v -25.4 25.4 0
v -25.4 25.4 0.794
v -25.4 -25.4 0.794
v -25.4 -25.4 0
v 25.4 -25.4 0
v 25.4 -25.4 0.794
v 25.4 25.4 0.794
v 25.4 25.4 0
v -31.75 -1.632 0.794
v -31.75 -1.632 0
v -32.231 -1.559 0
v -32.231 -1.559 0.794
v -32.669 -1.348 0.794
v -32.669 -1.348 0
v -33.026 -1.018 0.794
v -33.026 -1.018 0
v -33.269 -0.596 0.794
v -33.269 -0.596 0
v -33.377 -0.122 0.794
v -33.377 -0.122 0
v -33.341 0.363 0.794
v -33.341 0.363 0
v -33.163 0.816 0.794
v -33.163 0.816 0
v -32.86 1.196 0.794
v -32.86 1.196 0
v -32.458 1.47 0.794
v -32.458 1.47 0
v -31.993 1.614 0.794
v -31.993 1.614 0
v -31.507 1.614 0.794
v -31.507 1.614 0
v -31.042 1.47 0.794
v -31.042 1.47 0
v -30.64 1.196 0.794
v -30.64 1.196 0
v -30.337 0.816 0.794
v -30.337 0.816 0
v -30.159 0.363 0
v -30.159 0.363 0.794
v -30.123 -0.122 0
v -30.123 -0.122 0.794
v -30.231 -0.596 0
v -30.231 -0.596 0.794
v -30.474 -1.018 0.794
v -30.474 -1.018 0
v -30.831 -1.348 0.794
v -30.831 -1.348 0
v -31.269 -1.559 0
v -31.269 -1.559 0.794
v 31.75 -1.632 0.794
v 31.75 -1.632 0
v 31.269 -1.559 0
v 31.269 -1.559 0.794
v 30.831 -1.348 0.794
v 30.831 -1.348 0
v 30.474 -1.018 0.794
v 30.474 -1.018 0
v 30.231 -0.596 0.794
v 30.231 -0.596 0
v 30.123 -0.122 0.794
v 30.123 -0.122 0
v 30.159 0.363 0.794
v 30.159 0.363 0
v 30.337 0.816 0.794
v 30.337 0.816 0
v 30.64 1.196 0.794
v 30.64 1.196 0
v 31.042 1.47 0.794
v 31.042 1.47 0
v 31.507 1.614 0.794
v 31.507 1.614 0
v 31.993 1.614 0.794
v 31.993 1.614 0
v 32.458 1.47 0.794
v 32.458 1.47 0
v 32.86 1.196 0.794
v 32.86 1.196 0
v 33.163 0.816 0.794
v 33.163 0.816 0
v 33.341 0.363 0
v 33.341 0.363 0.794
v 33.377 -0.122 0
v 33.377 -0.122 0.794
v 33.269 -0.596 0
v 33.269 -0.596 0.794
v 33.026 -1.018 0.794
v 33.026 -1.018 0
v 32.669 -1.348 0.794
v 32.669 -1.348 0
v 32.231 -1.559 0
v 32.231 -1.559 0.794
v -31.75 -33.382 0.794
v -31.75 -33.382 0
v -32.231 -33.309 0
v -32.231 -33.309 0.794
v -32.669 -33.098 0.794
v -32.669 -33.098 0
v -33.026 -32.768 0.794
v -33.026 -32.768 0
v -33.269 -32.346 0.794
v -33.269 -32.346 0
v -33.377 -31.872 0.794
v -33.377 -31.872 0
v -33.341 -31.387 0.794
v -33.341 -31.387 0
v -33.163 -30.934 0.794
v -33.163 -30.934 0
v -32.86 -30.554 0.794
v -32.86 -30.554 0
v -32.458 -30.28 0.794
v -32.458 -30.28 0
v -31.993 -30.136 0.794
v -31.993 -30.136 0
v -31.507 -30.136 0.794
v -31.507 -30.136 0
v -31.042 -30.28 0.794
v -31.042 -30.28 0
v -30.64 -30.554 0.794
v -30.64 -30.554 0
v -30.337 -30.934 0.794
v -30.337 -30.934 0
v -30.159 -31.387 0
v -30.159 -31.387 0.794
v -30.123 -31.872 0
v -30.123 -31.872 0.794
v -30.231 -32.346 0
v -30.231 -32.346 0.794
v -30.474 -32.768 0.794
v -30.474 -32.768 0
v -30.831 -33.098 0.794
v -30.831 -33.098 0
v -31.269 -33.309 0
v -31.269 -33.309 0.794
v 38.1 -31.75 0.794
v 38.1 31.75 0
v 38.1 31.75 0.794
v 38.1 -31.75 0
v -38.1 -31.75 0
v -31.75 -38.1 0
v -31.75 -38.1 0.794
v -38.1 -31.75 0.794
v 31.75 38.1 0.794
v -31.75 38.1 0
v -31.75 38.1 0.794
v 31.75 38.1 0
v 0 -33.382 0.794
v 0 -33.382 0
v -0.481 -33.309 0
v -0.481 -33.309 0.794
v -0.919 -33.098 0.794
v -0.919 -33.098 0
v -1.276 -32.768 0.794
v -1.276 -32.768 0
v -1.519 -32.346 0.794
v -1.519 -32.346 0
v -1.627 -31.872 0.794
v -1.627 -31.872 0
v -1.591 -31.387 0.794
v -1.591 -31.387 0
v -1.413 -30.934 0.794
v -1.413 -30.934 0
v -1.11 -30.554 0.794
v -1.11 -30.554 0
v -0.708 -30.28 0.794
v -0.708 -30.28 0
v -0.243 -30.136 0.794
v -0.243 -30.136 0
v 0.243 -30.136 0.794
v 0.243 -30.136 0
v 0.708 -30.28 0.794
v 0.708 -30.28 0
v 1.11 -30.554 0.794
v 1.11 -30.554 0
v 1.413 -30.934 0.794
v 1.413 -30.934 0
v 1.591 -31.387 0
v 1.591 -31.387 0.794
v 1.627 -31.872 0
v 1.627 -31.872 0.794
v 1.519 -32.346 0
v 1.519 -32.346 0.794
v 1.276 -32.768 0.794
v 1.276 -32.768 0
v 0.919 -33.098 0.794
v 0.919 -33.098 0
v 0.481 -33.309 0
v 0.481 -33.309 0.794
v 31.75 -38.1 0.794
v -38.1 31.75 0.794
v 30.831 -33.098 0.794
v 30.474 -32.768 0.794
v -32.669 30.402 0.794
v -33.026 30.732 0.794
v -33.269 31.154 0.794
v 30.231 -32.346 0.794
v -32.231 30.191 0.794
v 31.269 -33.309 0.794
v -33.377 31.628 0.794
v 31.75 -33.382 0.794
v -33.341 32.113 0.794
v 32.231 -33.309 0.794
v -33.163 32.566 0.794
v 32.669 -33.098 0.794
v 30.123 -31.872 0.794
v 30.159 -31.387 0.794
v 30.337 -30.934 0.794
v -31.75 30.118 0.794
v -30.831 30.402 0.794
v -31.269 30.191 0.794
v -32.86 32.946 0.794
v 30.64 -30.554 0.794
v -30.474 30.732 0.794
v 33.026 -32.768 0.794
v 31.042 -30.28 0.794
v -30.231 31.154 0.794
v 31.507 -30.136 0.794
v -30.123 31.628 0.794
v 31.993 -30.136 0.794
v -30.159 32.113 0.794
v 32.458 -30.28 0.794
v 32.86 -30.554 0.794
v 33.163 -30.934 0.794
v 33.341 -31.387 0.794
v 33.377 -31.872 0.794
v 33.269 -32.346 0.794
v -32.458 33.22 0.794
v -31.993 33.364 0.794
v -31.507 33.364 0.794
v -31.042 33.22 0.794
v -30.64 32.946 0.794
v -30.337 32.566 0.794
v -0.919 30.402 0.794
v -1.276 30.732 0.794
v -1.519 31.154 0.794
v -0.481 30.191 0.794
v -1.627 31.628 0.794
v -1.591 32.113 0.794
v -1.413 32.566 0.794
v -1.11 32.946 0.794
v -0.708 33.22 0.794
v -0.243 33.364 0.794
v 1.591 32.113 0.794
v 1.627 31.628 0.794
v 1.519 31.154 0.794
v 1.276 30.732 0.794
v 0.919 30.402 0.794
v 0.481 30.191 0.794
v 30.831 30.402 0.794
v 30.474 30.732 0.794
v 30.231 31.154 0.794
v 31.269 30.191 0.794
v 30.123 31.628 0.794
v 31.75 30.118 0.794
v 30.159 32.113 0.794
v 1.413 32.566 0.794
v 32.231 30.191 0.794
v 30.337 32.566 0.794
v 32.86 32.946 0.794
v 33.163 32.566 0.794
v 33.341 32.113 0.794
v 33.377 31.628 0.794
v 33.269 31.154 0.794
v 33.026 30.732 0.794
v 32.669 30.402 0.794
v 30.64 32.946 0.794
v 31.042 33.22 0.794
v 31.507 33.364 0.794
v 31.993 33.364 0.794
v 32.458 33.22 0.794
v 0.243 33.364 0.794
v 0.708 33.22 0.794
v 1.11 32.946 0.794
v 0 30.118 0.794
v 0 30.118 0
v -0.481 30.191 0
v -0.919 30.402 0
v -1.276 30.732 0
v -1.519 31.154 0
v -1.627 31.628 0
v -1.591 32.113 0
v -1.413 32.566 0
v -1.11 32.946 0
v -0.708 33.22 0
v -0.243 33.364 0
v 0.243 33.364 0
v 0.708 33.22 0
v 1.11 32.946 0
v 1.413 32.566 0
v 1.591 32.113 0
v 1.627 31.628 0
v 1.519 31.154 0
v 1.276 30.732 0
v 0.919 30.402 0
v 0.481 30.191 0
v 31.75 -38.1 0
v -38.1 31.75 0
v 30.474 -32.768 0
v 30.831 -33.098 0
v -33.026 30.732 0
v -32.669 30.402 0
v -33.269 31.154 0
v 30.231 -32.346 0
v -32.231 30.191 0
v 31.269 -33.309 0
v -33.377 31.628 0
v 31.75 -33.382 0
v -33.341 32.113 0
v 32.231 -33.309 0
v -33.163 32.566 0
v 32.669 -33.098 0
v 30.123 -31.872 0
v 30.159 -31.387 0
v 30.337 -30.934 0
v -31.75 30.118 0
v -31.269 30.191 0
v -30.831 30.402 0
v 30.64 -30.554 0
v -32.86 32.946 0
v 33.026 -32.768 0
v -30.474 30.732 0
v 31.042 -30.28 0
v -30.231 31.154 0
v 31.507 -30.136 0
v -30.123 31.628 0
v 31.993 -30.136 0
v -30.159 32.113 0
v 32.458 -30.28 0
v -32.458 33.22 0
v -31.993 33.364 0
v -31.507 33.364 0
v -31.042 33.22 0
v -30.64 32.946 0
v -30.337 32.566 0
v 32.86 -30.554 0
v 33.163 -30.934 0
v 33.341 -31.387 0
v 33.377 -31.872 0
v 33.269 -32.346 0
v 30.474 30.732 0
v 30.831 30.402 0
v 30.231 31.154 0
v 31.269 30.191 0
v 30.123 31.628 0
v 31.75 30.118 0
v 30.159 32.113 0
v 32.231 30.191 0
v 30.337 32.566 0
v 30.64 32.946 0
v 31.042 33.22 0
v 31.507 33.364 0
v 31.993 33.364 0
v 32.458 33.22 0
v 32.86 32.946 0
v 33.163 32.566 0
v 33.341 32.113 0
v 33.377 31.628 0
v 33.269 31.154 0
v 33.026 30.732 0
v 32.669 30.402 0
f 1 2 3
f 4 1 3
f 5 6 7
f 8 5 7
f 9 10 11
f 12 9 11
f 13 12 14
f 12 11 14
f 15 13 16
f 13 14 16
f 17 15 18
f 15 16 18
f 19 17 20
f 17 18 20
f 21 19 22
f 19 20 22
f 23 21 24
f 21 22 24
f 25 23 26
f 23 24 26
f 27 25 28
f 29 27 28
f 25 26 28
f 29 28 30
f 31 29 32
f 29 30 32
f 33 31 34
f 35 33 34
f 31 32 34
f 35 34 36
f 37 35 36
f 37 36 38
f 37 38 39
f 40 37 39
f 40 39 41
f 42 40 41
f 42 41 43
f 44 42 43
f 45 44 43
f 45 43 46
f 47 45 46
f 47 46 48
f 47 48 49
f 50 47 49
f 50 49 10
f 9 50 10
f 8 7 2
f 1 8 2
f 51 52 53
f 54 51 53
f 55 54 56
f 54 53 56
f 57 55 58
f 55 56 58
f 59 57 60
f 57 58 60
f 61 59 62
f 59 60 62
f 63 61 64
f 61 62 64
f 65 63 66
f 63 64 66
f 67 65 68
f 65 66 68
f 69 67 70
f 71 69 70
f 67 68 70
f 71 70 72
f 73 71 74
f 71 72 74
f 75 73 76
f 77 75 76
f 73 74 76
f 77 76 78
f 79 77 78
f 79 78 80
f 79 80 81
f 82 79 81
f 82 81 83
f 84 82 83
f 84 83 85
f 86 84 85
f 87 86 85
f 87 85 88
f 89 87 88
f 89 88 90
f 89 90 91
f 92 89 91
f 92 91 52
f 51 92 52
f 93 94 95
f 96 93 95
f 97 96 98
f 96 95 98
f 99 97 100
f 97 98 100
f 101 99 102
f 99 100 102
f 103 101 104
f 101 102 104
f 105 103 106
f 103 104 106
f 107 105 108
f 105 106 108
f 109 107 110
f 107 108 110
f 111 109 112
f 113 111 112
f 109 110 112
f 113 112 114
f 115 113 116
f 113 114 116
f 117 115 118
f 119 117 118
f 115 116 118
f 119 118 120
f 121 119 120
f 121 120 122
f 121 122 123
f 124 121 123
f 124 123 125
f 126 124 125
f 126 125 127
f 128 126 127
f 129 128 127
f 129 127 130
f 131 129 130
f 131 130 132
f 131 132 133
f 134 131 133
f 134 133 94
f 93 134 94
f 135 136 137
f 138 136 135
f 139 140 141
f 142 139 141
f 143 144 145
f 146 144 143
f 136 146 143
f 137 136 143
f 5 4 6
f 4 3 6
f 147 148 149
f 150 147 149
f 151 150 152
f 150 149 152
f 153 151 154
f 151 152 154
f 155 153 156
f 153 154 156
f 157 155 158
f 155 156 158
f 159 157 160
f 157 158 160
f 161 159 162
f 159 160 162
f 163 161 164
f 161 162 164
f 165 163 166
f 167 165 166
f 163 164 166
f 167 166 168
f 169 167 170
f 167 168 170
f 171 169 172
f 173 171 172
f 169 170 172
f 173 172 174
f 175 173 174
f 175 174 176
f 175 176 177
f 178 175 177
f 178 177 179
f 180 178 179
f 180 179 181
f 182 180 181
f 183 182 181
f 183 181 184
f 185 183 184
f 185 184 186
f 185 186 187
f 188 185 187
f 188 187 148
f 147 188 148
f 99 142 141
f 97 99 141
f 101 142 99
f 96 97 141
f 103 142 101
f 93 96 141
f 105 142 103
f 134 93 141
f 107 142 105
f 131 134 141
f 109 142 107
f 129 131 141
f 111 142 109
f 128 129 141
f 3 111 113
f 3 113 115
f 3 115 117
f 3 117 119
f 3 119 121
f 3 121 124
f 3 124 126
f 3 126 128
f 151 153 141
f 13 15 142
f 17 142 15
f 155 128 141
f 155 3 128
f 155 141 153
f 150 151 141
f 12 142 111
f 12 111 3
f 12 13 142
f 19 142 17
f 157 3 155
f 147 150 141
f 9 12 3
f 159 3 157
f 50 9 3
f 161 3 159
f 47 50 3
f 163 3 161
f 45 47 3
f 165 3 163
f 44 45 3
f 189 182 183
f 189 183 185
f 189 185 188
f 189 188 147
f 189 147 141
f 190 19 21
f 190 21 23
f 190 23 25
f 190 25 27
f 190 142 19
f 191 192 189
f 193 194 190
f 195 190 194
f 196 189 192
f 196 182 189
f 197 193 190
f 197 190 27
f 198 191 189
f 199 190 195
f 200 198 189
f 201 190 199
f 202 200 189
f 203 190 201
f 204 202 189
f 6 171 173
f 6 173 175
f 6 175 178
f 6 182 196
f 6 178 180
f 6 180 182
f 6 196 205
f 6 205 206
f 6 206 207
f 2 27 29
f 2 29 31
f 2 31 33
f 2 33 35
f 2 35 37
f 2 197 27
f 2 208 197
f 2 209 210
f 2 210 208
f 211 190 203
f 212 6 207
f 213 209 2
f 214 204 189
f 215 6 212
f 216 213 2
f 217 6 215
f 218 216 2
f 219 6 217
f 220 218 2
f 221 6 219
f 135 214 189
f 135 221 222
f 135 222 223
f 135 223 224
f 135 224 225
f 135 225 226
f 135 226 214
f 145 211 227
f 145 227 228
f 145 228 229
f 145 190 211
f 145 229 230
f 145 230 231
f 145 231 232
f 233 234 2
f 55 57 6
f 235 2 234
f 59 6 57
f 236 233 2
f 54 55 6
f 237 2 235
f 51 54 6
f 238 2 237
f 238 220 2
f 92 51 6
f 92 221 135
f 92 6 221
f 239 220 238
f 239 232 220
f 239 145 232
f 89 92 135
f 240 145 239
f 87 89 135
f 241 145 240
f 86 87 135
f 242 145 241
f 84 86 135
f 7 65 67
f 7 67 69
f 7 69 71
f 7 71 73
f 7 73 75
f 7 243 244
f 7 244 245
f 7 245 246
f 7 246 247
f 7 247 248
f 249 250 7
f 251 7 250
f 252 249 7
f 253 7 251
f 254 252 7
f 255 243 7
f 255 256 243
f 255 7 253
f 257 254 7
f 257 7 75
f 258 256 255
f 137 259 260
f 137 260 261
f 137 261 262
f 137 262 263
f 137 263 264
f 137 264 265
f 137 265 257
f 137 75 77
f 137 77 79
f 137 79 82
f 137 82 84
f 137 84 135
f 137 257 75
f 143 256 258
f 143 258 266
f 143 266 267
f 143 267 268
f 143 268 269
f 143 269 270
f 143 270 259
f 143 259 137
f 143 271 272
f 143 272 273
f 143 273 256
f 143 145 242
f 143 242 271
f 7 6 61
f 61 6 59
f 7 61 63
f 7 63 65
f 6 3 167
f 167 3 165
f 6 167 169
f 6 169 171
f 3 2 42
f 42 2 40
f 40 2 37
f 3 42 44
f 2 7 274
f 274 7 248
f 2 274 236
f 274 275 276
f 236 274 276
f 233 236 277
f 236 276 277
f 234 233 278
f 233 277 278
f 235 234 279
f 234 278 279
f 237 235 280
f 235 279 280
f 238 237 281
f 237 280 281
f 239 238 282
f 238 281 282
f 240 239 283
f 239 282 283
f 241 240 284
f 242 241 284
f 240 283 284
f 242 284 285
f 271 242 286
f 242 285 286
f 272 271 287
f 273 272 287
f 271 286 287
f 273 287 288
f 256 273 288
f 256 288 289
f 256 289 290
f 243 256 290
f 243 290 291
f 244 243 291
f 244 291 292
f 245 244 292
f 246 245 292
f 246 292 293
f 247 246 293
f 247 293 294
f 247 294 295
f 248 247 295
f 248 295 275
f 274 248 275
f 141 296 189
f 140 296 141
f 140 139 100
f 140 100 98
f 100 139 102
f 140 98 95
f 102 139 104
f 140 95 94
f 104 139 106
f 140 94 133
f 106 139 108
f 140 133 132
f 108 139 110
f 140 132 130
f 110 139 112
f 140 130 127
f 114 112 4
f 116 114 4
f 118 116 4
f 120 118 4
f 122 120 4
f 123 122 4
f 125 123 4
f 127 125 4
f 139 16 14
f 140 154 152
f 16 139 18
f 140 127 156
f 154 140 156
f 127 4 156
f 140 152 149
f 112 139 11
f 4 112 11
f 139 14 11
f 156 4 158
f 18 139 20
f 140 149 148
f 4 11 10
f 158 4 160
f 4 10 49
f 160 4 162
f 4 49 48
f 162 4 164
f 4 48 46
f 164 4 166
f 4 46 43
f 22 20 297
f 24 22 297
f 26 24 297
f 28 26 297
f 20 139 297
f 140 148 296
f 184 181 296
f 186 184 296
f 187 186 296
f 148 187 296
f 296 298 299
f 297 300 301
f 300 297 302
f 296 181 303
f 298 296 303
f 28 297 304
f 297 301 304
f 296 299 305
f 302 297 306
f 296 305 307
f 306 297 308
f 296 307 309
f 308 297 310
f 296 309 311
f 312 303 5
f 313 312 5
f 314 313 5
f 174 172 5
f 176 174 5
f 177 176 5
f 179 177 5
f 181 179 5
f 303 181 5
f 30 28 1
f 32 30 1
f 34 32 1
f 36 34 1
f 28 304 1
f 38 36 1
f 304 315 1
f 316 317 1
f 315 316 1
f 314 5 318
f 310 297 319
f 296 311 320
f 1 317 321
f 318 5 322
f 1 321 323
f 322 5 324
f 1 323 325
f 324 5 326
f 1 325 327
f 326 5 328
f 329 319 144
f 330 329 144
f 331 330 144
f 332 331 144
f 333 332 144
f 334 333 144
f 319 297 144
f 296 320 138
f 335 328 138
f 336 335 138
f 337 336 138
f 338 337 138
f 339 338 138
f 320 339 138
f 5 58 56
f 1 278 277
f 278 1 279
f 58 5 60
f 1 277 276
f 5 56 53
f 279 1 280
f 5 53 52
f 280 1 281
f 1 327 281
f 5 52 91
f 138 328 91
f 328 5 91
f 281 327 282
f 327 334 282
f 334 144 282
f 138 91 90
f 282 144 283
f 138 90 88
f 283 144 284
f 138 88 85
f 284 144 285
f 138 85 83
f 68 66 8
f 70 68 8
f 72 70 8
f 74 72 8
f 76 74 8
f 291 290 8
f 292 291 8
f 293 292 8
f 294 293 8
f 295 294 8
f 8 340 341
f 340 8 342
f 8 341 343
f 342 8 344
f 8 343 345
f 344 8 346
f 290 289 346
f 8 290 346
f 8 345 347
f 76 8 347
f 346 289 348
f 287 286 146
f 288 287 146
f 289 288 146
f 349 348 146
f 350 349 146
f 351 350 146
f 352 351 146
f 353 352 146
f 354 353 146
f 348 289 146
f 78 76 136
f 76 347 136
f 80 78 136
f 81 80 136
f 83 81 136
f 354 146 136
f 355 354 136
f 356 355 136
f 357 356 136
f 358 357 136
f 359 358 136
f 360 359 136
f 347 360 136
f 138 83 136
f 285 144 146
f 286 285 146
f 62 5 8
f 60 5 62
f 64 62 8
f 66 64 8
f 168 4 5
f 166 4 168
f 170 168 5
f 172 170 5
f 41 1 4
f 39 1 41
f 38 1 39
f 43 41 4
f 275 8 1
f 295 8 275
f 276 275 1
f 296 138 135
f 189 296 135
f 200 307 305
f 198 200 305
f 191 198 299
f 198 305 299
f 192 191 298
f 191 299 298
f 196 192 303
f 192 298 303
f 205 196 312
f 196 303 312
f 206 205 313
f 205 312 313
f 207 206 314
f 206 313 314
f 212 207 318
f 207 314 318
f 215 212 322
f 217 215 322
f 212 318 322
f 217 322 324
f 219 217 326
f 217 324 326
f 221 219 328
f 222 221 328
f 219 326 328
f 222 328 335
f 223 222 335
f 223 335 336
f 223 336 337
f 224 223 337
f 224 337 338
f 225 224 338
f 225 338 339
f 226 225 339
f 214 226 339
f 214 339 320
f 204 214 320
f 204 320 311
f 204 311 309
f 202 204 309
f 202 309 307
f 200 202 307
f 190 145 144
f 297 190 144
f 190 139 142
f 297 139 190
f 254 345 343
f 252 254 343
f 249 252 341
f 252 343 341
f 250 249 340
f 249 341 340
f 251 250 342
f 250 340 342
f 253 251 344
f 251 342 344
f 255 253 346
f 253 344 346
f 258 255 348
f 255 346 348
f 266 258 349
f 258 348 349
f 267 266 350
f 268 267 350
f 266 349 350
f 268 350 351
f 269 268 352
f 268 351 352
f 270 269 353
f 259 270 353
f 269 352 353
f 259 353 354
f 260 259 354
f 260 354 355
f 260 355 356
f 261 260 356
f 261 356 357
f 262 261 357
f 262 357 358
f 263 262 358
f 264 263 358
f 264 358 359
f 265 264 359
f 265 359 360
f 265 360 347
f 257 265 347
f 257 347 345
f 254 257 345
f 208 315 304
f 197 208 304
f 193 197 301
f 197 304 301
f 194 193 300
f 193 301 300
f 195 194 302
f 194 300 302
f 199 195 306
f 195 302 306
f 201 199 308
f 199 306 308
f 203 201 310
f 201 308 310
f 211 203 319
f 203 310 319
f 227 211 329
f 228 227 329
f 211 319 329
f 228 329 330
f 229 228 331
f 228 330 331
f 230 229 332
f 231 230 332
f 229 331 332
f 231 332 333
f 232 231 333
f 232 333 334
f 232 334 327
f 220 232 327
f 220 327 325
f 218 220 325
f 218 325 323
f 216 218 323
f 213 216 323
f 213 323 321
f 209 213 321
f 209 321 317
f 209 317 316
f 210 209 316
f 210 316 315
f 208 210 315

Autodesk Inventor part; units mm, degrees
ref_plane "YZ Plane" through (0, 0, 0) normal (1, 0, 0) x (0, 1, 0)
ref_plane "XZ Plane" through (0, 0, 0) normal (0, 1, 0) x (-1, 0, 0)
ref_plane "XY Plane" through (0, 0, 0) normal (0, 0, 1) x (1, 0, 0)
sketch "Sketch1" plane through (0, 0, 0) normal (0, 0, 1) x (1, 0, 0)
  line L0 (-38.1, 38.1) -> (38.1, 38.1)
  line L1 (38.1, 38.1) -> (38.1, -38.1)
  line L2 (38.1, -38.1) -> (-38.1, -38.1)
  line L3 (-38.1, -38.1) -> (-38.1, 38.1)
  line L4 (-38.1, 38.1) -> (38.1, -38.1) construction
  line L5 (38.1, 38.1) -> (-38.1, -38.1) construction
  point P0 (0, 0)
  dimension "d0" = 76.2
  dimension "d1" = 76.2
extrude "Extrusion1" add sketch "Sketch1" along normal blind 0.7937
sketch "Sketch2" plane through (0, 0, 0.7937) normal (0, 0, 1) x (1, 0, 0)
  line L0 (38.1, 38.1) -> (-38.1, 38.1) projected
  line L1 (-38.1, 38.1) -> (-38.1, -38.1) projected
  line L2 (-38.1, -38.1) -> (38.1, -38.1) projected
  line L3 (38.1, -38.1) -> (38.1, 38.1) projected
  line L4 (-31.75, 31.75) -> (31.75, 31.75)
  line L5 (31.75, 31.75) -> (31.75, -31.75)
  line L6 (31.75, -31.75) -> (-31.75, -31.75)
  line L7 (-31.75, -31.75) -> (-31.75, 31.75)
  point P0 (0, 0)
  point P1 (0, 31.75)
  point P2 (31.75, 0)
  point P3 (0, -31.75)
  point P4 (-31.75, 0)
  dimension "d7" = 6.35
chamfer "Chamfer1" distance 6.35 angle 45 4 edges at (38.1, 38.1, 0.3969) (-38.1, 38.1, 0.3969) (38.1, -38.1, 0.3969) (-38.1, -38.1, 0.3969)
hole "Hole1" at (-31.75, 31.75, 0.7937) at (0, 31.75, 0.7937) at (31.75, 31.75, 0.7937) at (31.75, 0, 0.7937) at (31.75, -31.75, 0.7937) at (0, -31.75, 0.7937) at (-31.75, -31.75, 0.7937) at (-31.75, 0, 0.7937) direction (0, 0, -1) diameter 3.264 end through all clearance for "Hex Machine Screw" size "#4" standard "Ansi Unified Screw Threads"
sketch "Sketch3" plane through (0, 0, 0.7937) normal (0, 0, 1) x (1, 0, 0)
  line L0 (-25.4, -25.4) -> (25.4, -25.4)
  line L1 (25.4, -25.4) -> (25.4, 25.4)
  line L2 (25.4, 25.4) -> (-25.4, 25.4)
  line L3 (-25.4, 25.4) -> (-25.4, -25.4)
  line L4 (-25.4, -25.4) -> (25.4, 25.4) construction
  line L5 (25.4, -25.4) -> (-25.4, 25.4) construction
  point P0 (0, 0)
  dimension "d15" = 50.8
  dimension "d16" = 50.8
extrude "Extrusion2" cut sketch "Sketch3" against normal through all
equation "\"d7\" = backplaneHoleOffsett"
equation "\"frameAcrylicThickness\" = 9.525"
equation "\"internalAcrylicThickness\" = 6.35"
equation "\"height\" = 127"
equation "\"width\" = 127"
equation "\"depth\" = 273.05"
equation "\"mirrorAngle\" = 5deg"
equation "\"detectorWidth\" = 52"
equation "\"detectorHeight\" = 52"
equation "\"mirrorThickness\" = 3.175"
equation "\"fresnelThickness\" = 0.1"
equation "\"focalLength\" = 76.2"
equation "\"ior\" = 1.49"
equation "\"centerThickness\" = 1.524"
equation "\"fresnelAngle\" = 90deg"
equation "\"fresnelEffectiveDiameter\" = 152.4"
equation "\"oRingWidth\" = 1.5875"
equation "\"sensorHolderDepth\" = 19.05"
equation "\"aerogelClearence\" = 3.175"
equation "\"backplanePCBWidth\" = 76.2"
equation "\"backplanePCBHeight\" = 76.2"
equation "\"backplaneHoleOffsett\" = 6.35"
equation "\"backplanePostionOffsett\" = 12.7"
equation "\"moduleSlotClearence\" = 0.79375"
properties part number "backplaneGasket" material "Rubber"
